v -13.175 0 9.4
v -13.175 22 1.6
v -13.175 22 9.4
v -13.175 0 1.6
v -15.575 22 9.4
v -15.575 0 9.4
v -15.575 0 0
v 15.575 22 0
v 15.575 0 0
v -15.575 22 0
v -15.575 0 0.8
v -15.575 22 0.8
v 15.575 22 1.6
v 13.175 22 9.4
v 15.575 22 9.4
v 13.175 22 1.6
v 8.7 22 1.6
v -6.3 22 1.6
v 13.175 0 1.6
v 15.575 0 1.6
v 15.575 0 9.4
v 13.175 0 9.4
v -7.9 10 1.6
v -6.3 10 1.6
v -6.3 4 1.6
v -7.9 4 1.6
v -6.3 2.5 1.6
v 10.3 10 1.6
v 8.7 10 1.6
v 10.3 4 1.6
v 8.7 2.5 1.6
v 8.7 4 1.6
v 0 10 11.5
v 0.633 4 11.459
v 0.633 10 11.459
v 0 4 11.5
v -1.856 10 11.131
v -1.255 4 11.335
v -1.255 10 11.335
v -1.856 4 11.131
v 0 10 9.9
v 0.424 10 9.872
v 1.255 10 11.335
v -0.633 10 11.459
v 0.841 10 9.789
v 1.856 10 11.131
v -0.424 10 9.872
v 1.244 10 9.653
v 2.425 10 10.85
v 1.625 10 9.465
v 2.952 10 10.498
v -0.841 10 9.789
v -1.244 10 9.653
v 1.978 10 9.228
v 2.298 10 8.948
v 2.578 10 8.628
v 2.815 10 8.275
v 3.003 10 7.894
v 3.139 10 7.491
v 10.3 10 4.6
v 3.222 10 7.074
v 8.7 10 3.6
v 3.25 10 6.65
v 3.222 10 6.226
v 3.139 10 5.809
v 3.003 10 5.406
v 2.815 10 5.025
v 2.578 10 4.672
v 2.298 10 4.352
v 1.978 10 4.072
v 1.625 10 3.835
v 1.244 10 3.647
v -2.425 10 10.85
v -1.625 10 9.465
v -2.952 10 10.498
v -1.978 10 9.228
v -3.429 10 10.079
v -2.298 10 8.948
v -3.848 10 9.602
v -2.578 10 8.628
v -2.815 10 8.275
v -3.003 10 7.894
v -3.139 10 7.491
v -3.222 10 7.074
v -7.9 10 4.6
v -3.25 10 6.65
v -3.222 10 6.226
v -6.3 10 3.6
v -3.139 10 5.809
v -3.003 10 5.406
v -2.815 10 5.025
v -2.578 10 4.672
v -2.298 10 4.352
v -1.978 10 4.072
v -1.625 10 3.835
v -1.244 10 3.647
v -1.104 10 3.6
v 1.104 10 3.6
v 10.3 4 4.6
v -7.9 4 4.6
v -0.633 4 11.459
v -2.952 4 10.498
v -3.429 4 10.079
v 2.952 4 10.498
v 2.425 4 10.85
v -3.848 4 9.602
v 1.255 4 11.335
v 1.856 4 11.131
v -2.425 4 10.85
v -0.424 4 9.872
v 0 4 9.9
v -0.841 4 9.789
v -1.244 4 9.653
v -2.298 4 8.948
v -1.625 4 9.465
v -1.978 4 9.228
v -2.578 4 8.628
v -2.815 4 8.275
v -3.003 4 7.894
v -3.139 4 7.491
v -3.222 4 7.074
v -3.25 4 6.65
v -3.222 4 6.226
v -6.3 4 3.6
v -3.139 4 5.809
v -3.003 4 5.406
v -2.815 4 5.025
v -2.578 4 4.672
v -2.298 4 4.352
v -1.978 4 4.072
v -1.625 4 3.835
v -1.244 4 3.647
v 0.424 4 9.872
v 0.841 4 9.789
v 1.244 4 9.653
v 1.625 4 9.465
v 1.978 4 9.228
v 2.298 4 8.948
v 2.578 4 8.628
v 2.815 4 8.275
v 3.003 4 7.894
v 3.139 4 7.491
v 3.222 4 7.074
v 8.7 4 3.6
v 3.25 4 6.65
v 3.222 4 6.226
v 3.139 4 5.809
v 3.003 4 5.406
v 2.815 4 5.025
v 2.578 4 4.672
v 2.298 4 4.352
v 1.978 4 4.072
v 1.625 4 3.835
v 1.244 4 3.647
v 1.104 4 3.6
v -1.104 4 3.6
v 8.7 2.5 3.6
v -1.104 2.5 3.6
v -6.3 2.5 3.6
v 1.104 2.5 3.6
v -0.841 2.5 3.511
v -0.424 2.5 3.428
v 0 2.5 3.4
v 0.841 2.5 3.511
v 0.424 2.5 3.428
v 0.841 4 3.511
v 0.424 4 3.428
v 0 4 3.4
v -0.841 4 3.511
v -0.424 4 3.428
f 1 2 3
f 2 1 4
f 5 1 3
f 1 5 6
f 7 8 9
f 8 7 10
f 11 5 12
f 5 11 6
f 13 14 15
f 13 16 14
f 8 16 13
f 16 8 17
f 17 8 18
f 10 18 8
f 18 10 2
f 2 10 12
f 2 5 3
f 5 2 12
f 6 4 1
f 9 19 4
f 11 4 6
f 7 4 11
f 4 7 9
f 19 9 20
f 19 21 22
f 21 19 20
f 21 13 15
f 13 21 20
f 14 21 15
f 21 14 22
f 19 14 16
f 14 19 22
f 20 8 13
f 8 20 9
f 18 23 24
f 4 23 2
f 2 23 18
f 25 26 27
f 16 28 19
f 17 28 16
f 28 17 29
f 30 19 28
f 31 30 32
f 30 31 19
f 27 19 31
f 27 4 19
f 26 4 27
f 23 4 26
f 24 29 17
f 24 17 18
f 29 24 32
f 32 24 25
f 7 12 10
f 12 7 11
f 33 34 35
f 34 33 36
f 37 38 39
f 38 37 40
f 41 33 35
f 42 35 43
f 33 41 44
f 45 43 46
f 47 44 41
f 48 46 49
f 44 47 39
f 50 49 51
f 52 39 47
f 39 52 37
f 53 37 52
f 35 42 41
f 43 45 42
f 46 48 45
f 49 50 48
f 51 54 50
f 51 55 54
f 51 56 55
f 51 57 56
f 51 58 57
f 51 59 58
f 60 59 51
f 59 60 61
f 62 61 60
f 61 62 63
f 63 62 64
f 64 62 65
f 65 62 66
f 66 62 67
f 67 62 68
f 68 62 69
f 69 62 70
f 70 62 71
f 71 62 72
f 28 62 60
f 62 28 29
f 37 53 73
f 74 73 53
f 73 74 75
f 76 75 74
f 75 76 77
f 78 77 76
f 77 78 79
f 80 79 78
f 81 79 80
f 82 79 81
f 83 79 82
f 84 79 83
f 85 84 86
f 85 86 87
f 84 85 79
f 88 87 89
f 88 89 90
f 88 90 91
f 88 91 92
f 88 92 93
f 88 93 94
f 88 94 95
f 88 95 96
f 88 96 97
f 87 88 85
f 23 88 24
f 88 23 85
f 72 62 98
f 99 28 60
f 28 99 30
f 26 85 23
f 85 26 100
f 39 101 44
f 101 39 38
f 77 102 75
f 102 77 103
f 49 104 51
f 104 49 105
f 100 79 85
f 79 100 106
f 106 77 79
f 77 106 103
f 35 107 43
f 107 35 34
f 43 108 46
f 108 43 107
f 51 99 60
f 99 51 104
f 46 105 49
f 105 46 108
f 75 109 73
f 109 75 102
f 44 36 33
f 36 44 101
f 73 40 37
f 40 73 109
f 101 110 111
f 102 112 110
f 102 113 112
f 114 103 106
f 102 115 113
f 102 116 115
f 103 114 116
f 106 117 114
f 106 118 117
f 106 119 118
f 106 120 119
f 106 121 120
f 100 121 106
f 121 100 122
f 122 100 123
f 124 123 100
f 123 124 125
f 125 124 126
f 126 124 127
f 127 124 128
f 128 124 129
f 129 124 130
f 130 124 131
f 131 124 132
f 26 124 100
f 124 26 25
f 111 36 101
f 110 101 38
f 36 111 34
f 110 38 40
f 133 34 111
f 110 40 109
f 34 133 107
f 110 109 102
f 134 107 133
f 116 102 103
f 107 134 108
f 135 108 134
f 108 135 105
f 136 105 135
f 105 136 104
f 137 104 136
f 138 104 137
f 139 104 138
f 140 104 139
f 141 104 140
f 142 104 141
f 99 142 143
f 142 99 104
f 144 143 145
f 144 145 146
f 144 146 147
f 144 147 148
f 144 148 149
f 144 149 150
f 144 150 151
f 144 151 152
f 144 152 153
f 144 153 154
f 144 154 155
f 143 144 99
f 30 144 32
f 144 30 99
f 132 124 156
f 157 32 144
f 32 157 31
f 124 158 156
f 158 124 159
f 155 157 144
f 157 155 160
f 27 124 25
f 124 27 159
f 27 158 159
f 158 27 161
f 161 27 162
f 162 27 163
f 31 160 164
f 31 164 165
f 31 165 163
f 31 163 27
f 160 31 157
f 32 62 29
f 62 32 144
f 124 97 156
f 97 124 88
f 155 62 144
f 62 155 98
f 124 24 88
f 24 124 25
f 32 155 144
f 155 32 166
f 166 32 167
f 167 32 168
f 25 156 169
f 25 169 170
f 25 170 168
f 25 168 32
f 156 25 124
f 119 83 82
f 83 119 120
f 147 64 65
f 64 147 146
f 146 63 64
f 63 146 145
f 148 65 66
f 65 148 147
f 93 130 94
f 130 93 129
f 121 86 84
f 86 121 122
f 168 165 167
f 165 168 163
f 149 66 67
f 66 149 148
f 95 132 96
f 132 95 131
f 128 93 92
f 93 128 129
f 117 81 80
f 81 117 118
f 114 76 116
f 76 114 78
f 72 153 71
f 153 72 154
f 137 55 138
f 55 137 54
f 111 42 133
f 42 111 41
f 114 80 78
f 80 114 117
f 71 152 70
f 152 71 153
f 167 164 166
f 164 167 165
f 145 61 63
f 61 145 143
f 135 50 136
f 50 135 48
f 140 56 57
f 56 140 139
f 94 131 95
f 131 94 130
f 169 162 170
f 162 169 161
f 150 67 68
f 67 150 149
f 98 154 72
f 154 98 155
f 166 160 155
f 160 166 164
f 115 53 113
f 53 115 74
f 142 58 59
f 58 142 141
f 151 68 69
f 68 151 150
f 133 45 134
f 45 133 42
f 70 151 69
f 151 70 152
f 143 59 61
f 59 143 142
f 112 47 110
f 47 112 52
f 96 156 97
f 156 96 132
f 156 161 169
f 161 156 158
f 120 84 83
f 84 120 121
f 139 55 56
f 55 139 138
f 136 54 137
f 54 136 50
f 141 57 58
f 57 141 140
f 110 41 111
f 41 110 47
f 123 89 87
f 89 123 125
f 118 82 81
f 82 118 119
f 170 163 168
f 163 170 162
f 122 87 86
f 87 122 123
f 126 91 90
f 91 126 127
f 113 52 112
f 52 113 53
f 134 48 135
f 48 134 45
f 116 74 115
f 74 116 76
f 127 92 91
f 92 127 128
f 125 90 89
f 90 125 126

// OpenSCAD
// Laser holder v3: snaps between the 2 clip tabs on the pan-tilt's top platform. No zip ties.
// STANDALONE PRINT FILE (one file, for web OpenSCAD).
//
// How it holds:
//  - Platform: its 2 upright tabs (1 mm thick, ~11 mm tall, ~1 mm hook at the top pointing inward)
//    are ~30.25 mm apart. The holder is a tray exactly that wide: push it down between the tabs,
//    they flex out, and the hooks click over the top of its side walls.
//  - Laser: the KY-008 slides in from the BACK, flat on the tray floor, until its PCB hits the
//    small front stop. The brass head goes through the hood, which keeps it from lifting or turning.
//    The pins stick out the back. A dab of hot glue at the back of the PCB stops it sliding out.
//
// Measured (rough, 2026-11-19): tab gap 30.25, tab height 11, platform 35 x 38,
// laser head ~5 dia, PCB 9 x 18 x 1, PCB bottom to head top ~7-8.
// v3 (after test print 1): tray was loose between the tabs, PCB is 14 wide (not 9),
// head hole was ~3 mm too small.
// v4 (test print 2): hole 6.5 is right, head 1.0 higher, PCB slot 15 wide x 2 tall, head off-centre (head_dx).
// It's a 10-minute print: print one, test it, adjust the numbers marked TUNE.
//
// Print: flat as drawn (floor on the bed), no supports. Beam points to -y.

/* [Platform clip] */
tab_gap  = 30.25;  // inside gap between the 2 tabs
side_fit = -0.9;   // TUNE: tray width = tab_gap - side_fit = 31.15. v2 0.35 and v3 0.1 were loose; test print
                   // said +1 mm. Negative = wider than the measured gap (the tabs flex out to grip it).
snap_h   = 9.4;    // TUNE: tray wall height = where the hooks catch (tab height 11 - hook ~1.5).
                   // Hooks don't click over: lower it 0.5. Tray rattles up/down: raise it 0.3.
side_t   = 2.4;    // tray wall thickness (the hooks rest on it)
entry    = 0.8;    // chamfer on the bottom outer edges so the tray pushes the tabs apart

/* [Laser KY-008] */
head_d   = 6.1;    // TUNE: brass head diameter. Hole = head_d + head_fit = 6.5 (v2's 5.4 hole was too small).
head_fit = 0.4;    // added to the hood bore
head_lift = 1.0;   // TUNE: head centre sits this much higher than "head resting on the PCB" (test print 2)
head_dx  = 1.2;    // TUNE: the head is off-centre on the board. Head centre is this much LEFT of the
                   // board's centre, looking at the front (beam coming at you). Measured ~6.5 of 15. Wrong side: -1.2
head_out = 4;      // how far the head sticks out past the PCB's front edge
pcb      = [14, 18];  // [across the beam (side to side), along the beam (head -> pins)]
pcb_t    = 1.0;
pcb_fit  = 1.0;    // TUNE: extra slot width (v3 had 0.4)
pcb_t_fit = 1.0;   // TUNE: extra slot height (v3 had 0.4, too tight)
hood_len = 6;      // how much of the head the hood covers, from the PCB's front edge back
hood_t   = 1.6;

/* [Tray] */
floor_t  = 1.6;

$fn = 48;

W  = tab_gap - side_fit;       // tray width
pw = pcb[0] + pcb_fit;         // PCB slot width
L  = head_out + pcb[1];        // tray length: head nose at the front edge, PCB back edge at the back
y_pcb = head_out;              // PCB front edge
hz = floor_t + pcb_t + head_d / 2 + head_lift;   // head centre height
bore = head_d + head_fit;
hw = pw + 2 * hood_t;          // hood width

module tray_side(s) {   // one side wall with the entry chamfer on its bottom outer edge
    translate([s > 0 ? W / 2 - side_t : -W / 2, 0, 0])
        difference() {
            cube([side_t, L, snap_h]);
            translate([s > 0 ? side_t : 0, -1, 0]) rotate([0, 45, 0])
                translate([-entry * 0.7071, 0, -entry * 0.7071]) cube([entry * 1.4142, L + 2, entry * 1.4142]);
        }
}

module laser_mount() {
    difference() {
        union() {
            translate([-W / 2, 0, 0]) cube([W, L, floor_t]);   // floor
            tray_side(-1); tray_side(1);                       // walls the tab hooks click over
            // hood over the head, just behind the PCB's front edge
            translate([0, y_pcb, 0]) hull() {
                translate([head_dx - hw / 2, 0, 0]) cube([hw, hood_len, floor_t + pcb_t + pcb_t_fit + 1]);
                translate([0, 0, hz]) rotate([-90, 0, 0]) cylinder(d = bore + 2 * hood_t, h = hood_len);
            }
            // front stop: a low bar the PCB edge butts against (the head passes over it)
            translate([head_dx - pw / 2, y_pcb - 1.5, 0]) cube([pw, 1.5, floor_t + pcb_t + pcb_t_fit]);
        }
        // PCB slot through the hood, open at the back. It reaches up to the bottom of the head hole
        // so the two join (hole = plain circle sitting on the slot).
        translate([head_dx - pw / 2, y_pcb, floor_t]) cube([pw, L, max(pcb_t + pcb_t_fit, hz - bore / 2 - floor_t + 0.1)]);
        // head hole through the hood
        translate([0, y_pcb - 2, hz]) rotate([-90, 0, 0]) cylinder(d = bore, h = hood_len + 4);
    }
}

laser_mount();
